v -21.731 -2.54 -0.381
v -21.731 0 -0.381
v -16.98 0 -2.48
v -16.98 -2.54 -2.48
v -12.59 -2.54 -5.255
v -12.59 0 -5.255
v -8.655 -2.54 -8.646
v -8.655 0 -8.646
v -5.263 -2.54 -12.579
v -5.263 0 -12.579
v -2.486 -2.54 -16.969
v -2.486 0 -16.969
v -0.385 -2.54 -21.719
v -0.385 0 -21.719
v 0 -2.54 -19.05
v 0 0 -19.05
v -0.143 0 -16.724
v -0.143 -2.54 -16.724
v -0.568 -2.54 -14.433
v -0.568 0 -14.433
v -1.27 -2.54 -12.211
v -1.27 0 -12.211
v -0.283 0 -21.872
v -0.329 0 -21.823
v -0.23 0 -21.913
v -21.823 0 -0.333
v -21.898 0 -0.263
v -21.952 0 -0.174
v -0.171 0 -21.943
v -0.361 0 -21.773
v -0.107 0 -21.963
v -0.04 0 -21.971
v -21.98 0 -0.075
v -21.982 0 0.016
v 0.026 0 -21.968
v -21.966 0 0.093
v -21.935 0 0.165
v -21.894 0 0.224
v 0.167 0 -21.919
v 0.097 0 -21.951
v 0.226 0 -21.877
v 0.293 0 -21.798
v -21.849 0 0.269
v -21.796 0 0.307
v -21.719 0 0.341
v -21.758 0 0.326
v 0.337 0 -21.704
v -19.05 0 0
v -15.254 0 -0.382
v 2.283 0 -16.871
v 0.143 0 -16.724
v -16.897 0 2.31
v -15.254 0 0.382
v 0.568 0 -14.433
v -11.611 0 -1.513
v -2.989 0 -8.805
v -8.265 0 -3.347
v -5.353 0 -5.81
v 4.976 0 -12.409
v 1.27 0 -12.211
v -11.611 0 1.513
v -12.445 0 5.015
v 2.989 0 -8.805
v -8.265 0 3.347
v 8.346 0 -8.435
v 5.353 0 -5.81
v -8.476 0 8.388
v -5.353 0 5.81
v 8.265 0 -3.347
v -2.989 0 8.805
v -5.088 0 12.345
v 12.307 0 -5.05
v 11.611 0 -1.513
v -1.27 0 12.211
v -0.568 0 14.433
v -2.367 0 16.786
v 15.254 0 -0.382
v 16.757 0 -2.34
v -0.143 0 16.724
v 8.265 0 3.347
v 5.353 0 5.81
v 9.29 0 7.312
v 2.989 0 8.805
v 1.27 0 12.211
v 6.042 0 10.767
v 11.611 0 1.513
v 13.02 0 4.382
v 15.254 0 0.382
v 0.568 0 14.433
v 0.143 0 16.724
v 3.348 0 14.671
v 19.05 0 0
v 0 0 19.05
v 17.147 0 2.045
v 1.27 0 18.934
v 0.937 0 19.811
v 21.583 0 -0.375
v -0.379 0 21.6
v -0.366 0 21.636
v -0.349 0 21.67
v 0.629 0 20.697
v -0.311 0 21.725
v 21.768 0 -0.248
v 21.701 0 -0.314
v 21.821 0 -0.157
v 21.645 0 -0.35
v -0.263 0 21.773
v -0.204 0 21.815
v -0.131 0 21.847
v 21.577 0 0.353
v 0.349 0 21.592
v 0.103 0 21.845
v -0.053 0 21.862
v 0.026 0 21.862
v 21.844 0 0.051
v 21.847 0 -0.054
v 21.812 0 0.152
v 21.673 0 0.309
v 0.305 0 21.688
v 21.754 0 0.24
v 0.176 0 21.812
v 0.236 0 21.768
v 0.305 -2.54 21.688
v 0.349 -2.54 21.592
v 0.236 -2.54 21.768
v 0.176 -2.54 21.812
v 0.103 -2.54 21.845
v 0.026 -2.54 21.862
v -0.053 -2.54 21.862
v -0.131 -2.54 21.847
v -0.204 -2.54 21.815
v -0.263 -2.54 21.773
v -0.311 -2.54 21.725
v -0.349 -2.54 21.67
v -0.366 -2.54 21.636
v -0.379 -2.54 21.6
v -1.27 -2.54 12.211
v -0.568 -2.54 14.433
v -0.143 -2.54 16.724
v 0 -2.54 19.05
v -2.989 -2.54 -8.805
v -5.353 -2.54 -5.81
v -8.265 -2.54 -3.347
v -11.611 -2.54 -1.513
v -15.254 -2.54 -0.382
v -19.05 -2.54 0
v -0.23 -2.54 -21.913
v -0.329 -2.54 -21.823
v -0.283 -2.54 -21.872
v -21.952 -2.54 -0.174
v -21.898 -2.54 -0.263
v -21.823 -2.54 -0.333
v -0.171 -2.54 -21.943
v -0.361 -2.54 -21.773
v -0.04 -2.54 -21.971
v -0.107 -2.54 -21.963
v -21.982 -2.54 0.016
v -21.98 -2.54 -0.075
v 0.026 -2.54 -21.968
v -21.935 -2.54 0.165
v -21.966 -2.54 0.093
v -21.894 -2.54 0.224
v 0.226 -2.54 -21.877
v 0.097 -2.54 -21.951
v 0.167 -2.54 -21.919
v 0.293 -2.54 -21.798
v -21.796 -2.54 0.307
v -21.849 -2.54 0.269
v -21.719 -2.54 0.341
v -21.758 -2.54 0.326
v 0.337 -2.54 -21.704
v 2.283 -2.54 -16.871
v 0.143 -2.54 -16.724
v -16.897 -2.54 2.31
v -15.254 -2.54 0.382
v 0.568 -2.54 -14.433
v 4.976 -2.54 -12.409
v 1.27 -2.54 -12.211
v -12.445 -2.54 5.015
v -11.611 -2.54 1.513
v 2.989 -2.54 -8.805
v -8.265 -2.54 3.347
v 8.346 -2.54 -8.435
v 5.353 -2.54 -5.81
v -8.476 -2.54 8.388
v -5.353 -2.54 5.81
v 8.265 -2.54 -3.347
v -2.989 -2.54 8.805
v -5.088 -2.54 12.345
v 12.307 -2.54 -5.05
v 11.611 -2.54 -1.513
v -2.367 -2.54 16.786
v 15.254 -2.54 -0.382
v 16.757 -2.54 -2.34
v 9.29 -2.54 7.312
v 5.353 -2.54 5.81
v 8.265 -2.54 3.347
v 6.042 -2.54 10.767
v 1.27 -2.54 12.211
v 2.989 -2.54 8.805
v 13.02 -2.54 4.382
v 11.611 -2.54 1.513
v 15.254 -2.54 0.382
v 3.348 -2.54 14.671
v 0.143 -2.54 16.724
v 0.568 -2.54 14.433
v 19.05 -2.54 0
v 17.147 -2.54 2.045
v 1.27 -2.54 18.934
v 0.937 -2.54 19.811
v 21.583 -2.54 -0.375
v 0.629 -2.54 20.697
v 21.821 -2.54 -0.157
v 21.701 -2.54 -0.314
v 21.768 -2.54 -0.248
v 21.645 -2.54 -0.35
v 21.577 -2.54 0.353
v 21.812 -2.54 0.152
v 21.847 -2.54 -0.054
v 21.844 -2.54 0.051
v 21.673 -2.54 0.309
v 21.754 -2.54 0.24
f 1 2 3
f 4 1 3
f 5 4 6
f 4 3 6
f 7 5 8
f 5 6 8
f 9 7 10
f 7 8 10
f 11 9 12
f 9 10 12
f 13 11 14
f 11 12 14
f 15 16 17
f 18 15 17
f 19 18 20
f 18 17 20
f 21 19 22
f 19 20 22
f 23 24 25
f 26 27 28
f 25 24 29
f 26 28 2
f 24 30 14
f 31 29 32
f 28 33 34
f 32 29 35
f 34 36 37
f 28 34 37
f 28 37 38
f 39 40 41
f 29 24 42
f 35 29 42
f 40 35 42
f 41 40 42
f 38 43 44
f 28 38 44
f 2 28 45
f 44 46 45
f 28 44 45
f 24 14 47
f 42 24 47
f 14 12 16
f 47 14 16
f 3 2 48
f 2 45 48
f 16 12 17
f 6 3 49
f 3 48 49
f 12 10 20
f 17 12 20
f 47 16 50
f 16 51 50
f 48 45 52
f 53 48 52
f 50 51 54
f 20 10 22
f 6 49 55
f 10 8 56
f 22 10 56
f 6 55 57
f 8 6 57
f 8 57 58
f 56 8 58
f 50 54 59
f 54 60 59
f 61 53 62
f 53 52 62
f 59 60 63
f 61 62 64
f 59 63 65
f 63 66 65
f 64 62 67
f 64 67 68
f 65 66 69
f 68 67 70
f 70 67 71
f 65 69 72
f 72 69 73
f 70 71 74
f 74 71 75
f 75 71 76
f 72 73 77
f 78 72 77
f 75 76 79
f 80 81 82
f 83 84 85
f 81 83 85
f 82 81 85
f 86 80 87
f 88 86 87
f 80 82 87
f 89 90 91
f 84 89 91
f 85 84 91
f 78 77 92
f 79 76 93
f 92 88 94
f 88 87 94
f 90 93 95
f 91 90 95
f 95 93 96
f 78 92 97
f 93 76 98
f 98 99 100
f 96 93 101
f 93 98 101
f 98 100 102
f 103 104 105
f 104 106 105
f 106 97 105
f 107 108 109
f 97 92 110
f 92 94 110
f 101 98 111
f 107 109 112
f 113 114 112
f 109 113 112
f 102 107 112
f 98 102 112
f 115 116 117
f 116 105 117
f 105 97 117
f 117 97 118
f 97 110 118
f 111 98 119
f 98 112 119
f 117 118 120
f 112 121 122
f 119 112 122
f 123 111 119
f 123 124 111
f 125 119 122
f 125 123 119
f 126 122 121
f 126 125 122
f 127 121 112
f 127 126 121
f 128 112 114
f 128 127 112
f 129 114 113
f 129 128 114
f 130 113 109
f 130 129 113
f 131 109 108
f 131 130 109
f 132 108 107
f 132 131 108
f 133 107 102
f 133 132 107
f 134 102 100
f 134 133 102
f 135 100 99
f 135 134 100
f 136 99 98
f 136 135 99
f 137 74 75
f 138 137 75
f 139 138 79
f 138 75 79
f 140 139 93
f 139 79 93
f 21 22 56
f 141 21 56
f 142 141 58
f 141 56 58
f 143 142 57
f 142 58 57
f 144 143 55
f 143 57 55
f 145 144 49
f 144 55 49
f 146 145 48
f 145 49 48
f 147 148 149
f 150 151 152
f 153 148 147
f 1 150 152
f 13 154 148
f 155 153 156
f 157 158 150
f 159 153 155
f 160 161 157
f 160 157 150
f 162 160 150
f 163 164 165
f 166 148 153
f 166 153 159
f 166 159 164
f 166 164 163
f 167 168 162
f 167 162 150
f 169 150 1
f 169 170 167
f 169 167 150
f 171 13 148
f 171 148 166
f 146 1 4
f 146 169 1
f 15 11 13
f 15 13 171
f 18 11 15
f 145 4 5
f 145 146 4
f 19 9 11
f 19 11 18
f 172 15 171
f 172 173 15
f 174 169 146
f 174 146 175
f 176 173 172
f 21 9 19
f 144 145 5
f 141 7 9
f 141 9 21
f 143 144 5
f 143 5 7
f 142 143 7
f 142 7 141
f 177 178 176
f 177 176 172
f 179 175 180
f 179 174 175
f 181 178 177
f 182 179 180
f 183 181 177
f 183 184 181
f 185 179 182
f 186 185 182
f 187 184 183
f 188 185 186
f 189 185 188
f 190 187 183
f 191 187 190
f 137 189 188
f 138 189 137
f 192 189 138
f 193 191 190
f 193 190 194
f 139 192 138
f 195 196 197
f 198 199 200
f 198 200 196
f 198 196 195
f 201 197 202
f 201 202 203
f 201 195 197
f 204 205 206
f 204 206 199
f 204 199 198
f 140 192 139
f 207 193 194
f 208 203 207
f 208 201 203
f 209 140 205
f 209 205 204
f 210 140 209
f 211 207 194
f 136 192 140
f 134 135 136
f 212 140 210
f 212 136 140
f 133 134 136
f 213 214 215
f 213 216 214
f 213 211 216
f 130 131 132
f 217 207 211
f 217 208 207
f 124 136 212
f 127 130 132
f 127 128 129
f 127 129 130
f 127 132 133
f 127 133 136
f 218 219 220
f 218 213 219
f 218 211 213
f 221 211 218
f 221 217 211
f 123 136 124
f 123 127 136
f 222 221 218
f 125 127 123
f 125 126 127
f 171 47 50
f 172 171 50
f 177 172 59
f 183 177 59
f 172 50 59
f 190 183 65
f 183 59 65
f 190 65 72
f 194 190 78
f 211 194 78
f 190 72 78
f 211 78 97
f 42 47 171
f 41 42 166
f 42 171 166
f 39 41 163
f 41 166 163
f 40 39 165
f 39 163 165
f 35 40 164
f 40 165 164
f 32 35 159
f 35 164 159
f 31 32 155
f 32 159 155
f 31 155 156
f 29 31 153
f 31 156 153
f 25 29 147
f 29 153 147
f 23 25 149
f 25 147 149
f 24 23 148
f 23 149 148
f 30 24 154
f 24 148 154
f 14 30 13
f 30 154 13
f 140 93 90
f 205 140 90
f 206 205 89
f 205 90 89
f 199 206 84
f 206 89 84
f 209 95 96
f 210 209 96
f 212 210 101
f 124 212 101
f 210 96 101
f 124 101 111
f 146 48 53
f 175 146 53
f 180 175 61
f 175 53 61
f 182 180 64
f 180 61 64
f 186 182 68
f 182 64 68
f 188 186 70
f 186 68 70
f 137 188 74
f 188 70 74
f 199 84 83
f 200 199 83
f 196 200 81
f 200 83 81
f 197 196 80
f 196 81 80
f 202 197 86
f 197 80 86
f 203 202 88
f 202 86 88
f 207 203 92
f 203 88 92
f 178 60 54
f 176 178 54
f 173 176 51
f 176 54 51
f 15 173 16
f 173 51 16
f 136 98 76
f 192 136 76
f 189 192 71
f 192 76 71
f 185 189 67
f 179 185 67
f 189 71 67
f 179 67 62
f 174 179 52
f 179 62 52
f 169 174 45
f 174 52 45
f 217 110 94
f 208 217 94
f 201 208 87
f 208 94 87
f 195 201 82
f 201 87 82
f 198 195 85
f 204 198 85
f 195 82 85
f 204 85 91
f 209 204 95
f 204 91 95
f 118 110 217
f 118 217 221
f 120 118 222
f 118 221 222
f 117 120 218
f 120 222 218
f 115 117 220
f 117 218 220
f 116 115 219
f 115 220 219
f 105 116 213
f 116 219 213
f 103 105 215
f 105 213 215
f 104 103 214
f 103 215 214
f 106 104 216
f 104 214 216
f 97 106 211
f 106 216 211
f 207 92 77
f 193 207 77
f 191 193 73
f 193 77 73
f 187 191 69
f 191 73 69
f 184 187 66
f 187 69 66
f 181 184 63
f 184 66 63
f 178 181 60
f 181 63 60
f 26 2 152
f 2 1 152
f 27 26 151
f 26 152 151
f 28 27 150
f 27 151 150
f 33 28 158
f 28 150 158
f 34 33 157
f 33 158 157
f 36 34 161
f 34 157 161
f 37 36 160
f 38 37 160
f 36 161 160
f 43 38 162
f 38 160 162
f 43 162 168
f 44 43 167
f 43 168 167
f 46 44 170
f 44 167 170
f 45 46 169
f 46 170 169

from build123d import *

# Parameters (mm, degrees)
F2_DEPTH = 2.54
F1_R     = 0.381


with BuildPart() as f2:
    # F0 (on Front) → F2 (new body)
    with BuildSketch(Plane.XZ):
        with BuildLine():
            ThreePointArc((22.86, 0), (9.785629, 6.867781), (1.27, 18.933834))
            ThreePointArc((1.27, 18.933834), (0.570733, 20.876128), (0, 22.86))
            ThreePointArc((0, 22.86), (-8.432114, 8.432114), (-22.86, 0))
            ThreePointArc((-22.86, 0), (-8.650747, -8.650747), (0, -22.86))
            ThreePointArc((0, -22.86), (8.390302, -8.390302), (22.86, 0))
        make_face()
        with BuildLine():
            ThreePointArc((1.27, -12.210841), (0.320191, -15.571962), (0, -19.05))
            ThreePointArc((0, -19.05), (-0.320191, -15.571962), (-1.27, -12.210841))
            ThreePointArc((-1.27, -12.210841), (-8.265369, -3.346681), (-19.05, 0))
            ThreePointArc((-19.05, 0), (-8.265369, 3.346681), (-1.27, 12.210841))
            ThreePointArc((-1.27, 12.210841), (-0.320191, 15.571962), (0, 19.05))
            ThreePointArc((0, 19.05), (0.320191, 15.571962), (1.27, 12.210841))
            ThreePointArc((1.27, 12.210841), (8.265369, 3.346681), (19.05, 0))
            ThreePointArc((19.05, 0), (8.265369, -3.346681), (1.27, -12.210841))
        make_face(mode=Mode.SUBTRACT)
    extrude(amount=F2_DEPTH)

    # F1
    f1_edges = [f2.edges().sort_by_distance(p)[0] for p in [
        (0, -1.27, 22.86),
        (22.86, -1.27, 0),
        (0, -1.27, -22.86),
        (-22.86, -1.27, 0),
    ]]
    fillet(f1_edges, radius=F1_R)


solid = f2.part
